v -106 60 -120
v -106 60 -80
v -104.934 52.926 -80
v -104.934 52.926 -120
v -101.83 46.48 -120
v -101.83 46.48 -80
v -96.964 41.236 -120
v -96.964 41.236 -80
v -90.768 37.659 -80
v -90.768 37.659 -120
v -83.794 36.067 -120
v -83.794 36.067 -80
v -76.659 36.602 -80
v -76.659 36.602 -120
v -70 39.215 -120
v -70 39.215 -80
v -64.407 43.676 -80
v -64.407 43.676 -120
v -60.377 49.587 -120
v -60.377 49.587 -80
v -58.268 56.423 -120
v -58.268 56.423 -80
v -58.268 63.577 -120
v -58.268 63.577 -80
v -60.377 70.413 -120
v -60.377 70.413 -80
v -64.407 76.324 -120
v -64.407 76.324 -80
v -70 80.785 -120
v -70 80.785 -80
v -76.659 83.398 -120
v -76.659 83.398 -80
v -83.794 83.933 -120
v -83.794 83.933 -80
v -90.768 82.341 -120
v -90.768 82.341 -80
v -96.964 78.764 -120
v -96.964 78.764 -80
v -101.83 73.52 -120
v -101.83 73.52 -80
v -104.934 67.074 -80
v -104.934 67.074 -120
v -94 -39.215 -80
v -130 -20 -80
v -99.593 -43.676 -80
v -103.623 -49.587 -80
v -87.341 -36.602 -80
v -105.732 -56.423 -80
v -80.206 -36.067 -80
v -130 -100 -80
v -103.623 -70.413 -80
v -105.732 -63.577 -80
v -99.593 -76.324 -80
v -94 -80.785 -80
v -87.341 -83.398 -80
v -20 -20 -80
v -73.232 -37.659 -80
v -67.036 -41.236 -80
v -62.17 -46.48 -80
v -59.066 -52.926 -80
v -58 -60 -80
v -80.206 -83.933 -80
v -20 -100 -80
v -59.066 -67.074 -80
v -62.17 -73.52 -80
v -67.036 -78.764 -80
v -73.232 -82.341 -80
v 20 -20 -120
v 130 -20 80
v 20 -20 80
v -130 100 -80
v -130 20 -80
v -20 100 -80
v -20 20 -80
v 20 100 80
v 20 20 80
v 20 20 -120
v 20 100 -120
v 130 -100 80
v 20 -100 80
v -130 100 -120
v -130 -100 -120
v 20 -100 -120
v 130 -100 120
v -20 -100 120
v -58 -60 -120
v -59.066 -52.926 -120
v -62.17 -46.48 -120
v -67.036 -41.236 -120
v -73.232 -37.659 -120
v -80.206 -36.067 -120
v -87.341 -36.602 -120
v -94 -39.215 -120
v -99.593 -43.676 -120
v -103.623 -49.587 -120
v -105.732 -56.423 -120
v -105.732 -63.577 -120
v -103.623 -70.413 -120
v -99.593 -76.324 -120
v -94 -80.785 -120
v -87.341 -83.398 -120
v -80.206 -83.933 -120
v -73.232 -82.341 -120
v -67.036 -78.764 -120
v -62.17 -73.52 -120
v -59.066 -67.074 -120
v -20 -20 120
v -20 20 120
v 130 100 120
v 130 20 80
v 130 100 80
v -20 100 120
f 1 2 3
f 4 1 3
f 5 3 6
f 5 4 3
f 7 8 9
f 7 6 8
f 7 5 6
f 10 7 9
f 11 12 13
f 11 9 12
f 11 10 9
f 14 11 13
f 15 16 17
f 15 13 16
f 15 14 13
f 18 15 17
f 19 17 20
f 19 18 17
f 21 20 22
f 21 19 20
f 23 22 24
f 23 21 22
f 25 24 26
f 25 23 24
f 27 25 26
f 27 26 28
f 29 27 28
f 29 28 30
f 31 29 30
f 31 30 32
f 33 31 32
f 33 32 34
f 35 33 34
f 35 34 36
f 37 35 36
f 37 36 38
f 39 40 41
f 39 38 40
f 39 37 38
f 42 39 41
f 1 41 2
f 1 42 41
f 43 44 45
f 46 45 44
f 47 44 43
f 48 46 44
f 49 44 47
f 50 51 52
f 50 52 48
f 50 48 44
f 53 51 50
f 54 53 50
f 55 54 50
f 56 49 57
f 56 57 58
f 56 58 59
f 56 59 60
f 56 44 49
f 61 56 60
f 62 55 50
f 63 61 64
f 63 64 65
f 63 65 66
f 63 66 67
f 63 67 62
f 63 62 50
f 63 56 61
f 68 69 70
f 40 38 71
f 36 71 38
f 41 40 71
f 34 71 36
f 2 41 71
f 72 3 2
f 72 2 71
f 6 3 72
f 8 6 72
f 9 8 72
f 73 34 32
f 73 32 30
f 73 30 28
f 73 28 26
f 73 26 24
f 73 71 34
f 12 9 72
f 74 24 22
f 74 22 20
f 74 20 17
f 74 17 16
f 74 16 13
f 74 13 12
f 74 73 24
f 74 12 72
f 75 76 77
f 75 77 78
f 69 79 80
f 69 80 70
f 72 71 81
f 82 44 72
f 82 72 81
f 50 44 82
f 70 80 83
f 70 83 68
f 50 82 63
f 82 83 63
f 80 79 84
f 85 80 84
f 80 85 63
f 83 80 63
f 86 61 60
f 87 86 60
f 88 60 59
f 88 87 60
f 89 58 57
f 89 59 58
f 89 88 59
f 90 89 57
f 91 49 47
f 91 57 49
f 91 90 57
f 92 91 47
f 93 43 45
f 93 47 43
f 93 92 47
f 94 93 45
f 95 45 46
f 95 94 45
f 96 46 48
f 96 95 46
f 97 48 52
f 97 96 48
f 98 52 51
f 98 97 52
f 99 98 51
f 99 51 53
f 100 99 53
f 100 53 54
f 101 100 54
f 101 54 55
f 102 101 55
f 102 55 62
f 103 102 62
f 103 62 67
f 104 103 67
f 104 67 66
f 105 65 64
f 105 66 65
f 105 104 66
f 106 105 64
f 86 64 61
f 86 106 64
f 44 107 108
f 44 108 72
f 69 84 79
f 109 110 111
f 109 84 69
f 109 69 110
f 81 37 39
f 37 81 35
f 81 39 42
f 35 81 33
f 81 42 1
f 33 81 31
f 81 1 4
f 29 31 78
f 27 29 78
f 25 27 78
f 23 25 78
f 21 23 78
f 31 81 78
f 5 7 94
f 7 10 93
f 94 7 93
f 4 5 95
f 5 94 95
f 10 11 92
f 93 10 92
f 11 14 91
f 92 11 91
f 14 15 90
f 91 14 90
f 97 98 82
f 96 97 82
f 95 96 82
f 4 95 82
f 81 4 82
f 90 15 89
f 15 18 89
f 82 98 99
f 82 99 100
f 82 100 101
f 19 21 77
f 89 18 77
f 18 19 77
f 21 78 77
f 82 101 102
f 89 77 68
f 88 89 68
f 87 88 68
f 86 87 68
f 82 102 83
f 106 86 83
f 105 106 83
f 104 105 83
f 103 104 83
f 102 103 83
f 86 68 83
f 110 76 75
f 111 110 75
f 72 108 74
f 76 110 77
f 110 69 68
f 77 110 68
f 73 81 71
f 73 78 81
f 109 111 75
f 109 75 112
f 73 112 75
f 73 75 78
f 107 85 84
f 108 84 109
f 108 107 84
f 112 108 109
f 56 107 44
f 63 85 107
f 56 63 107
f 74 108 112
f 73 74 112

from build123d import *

# Parameters (mm, degrees)
SKETCH1_W               = 200
SKETCH1_H               = 240
BOSS_EXTRUDE1_DEPTH     = 20
SKETCH2_W               = 200
SKETCH2_H               = 40
BOSS_EXTRUDE2_DEPTH     = 110
SKETCH3_W               = 200
SKETCH3_H               = 40
BOSS_EXTRUDE3_DEPTH     = 110
RIB1_REACH              = 205.224
SKETCH4_WALL_W          = 636.702272868
SKETCH4_WALL_H          = 40
RIB2_REACH              = 205.224
SKETCH6_WALL_W          = 636.702272868
SKETCH6_WALL_H          = 40
CUT_EXTRUDE1_DEPTH      = 259.650343128
CUT_EXTRUDE1_DEPTH_BACK = 259.650343128
SKETCH7_R               = 24


with BuildPart() as part:
    # Sketch1 → Boss-Extrude1 (new, symmetric)
    with BuildSketch(Plane.YZ):
        Rectangle(SKETCH1_W, SKETCH1_H)
    extrude(amount=BOSS_EXTRUDE1_DEPTH, both=True)

    # Sketch2 → Boss-Extrude2 (add)
    with BuildSketch(Plane.YZ.offset(20)):
        with Locations((0, 100)):
            Rectangle(SKETCH2_W, SKETCH2_H)
    extrude(amount=BOSS_EXTRUDE2_DEPTH)

    # Sketch3 → Boss-Extrude3 (add)
    with BuildSketch(Plane(origin=(-20, 0, 0), x_dir=(0, -1, 0), z_dir=(-1, 0, 0))):
        with Locations((0, -100)):
            Rectangle(SKETCH3_W, SKETCH3_H)
    extrude(amount=BOSS_EXTRUDE3_DEPTH)

    # Sketch4 wall → Rib1 (add, up to next)
    with BuildSketch(Plane(origin=(75, 0, -20), x_dir=(-0.481918749772, 0, -0.876215908677), z_dir=(-0.876215908677, 0, 0.481918749772)), mode=Mode.PRIVATE) as rib1_sk1:
        Rectangle(SKETCH4_WALL_W, SKETCH4_WALL_H)
    rib1_tool1 = extrude(rib1_sk1.sketch, amount=RIB1_REACH, mode=Mode.PRIVATE) - part.part
    add(rib1_tool1.solids().sort_by_distance((75, 0, -20))[0])

    # Sketch6 wall → Rib2 (add, up to next)
    with BuildSketch(Plane(origin=(-75, 0, 20), x_dir=(-0.481918749772, 0, -0.876215908677), z_dir=(-0.876215908677, 0, 0.481918749772)), mode=Mode.PRIVATE) as rib2_sk1:
        Rectangle(SKETCH6_WALL_W, SKETCH6_WALL_H)
    rib2_tool1 = extrude(rib2_sk1.sketch, amount=-RIB2_REACH, mode=Mode.PRIVATE) - part.part
    add(rib2_tool1.solids().sort_by_distance((-75, 0, 20))[0])

    # Sketch7 → Cut-Extrude1 (cut, two sides: drawn at the far end of the back side and taken through both)
    with BuildSketch(Plane.XY.offset(-80).offset(-CUT_EXTRUDE1_DEPTH_BACK)):
        with Locations((-82, -60)):
            Circle(SKETCH7_R)
        with Locations(Location((-82, 60, 0), (0, 0, 180))):
            Circle(SKETCH7_R)
    extrude(amount=CUT_EXTRUDE1_DEPTH + CUT_EXTRUDE1_DEPTH_BACK, mode=Mode.SUBTRACT)


solid = part.part
